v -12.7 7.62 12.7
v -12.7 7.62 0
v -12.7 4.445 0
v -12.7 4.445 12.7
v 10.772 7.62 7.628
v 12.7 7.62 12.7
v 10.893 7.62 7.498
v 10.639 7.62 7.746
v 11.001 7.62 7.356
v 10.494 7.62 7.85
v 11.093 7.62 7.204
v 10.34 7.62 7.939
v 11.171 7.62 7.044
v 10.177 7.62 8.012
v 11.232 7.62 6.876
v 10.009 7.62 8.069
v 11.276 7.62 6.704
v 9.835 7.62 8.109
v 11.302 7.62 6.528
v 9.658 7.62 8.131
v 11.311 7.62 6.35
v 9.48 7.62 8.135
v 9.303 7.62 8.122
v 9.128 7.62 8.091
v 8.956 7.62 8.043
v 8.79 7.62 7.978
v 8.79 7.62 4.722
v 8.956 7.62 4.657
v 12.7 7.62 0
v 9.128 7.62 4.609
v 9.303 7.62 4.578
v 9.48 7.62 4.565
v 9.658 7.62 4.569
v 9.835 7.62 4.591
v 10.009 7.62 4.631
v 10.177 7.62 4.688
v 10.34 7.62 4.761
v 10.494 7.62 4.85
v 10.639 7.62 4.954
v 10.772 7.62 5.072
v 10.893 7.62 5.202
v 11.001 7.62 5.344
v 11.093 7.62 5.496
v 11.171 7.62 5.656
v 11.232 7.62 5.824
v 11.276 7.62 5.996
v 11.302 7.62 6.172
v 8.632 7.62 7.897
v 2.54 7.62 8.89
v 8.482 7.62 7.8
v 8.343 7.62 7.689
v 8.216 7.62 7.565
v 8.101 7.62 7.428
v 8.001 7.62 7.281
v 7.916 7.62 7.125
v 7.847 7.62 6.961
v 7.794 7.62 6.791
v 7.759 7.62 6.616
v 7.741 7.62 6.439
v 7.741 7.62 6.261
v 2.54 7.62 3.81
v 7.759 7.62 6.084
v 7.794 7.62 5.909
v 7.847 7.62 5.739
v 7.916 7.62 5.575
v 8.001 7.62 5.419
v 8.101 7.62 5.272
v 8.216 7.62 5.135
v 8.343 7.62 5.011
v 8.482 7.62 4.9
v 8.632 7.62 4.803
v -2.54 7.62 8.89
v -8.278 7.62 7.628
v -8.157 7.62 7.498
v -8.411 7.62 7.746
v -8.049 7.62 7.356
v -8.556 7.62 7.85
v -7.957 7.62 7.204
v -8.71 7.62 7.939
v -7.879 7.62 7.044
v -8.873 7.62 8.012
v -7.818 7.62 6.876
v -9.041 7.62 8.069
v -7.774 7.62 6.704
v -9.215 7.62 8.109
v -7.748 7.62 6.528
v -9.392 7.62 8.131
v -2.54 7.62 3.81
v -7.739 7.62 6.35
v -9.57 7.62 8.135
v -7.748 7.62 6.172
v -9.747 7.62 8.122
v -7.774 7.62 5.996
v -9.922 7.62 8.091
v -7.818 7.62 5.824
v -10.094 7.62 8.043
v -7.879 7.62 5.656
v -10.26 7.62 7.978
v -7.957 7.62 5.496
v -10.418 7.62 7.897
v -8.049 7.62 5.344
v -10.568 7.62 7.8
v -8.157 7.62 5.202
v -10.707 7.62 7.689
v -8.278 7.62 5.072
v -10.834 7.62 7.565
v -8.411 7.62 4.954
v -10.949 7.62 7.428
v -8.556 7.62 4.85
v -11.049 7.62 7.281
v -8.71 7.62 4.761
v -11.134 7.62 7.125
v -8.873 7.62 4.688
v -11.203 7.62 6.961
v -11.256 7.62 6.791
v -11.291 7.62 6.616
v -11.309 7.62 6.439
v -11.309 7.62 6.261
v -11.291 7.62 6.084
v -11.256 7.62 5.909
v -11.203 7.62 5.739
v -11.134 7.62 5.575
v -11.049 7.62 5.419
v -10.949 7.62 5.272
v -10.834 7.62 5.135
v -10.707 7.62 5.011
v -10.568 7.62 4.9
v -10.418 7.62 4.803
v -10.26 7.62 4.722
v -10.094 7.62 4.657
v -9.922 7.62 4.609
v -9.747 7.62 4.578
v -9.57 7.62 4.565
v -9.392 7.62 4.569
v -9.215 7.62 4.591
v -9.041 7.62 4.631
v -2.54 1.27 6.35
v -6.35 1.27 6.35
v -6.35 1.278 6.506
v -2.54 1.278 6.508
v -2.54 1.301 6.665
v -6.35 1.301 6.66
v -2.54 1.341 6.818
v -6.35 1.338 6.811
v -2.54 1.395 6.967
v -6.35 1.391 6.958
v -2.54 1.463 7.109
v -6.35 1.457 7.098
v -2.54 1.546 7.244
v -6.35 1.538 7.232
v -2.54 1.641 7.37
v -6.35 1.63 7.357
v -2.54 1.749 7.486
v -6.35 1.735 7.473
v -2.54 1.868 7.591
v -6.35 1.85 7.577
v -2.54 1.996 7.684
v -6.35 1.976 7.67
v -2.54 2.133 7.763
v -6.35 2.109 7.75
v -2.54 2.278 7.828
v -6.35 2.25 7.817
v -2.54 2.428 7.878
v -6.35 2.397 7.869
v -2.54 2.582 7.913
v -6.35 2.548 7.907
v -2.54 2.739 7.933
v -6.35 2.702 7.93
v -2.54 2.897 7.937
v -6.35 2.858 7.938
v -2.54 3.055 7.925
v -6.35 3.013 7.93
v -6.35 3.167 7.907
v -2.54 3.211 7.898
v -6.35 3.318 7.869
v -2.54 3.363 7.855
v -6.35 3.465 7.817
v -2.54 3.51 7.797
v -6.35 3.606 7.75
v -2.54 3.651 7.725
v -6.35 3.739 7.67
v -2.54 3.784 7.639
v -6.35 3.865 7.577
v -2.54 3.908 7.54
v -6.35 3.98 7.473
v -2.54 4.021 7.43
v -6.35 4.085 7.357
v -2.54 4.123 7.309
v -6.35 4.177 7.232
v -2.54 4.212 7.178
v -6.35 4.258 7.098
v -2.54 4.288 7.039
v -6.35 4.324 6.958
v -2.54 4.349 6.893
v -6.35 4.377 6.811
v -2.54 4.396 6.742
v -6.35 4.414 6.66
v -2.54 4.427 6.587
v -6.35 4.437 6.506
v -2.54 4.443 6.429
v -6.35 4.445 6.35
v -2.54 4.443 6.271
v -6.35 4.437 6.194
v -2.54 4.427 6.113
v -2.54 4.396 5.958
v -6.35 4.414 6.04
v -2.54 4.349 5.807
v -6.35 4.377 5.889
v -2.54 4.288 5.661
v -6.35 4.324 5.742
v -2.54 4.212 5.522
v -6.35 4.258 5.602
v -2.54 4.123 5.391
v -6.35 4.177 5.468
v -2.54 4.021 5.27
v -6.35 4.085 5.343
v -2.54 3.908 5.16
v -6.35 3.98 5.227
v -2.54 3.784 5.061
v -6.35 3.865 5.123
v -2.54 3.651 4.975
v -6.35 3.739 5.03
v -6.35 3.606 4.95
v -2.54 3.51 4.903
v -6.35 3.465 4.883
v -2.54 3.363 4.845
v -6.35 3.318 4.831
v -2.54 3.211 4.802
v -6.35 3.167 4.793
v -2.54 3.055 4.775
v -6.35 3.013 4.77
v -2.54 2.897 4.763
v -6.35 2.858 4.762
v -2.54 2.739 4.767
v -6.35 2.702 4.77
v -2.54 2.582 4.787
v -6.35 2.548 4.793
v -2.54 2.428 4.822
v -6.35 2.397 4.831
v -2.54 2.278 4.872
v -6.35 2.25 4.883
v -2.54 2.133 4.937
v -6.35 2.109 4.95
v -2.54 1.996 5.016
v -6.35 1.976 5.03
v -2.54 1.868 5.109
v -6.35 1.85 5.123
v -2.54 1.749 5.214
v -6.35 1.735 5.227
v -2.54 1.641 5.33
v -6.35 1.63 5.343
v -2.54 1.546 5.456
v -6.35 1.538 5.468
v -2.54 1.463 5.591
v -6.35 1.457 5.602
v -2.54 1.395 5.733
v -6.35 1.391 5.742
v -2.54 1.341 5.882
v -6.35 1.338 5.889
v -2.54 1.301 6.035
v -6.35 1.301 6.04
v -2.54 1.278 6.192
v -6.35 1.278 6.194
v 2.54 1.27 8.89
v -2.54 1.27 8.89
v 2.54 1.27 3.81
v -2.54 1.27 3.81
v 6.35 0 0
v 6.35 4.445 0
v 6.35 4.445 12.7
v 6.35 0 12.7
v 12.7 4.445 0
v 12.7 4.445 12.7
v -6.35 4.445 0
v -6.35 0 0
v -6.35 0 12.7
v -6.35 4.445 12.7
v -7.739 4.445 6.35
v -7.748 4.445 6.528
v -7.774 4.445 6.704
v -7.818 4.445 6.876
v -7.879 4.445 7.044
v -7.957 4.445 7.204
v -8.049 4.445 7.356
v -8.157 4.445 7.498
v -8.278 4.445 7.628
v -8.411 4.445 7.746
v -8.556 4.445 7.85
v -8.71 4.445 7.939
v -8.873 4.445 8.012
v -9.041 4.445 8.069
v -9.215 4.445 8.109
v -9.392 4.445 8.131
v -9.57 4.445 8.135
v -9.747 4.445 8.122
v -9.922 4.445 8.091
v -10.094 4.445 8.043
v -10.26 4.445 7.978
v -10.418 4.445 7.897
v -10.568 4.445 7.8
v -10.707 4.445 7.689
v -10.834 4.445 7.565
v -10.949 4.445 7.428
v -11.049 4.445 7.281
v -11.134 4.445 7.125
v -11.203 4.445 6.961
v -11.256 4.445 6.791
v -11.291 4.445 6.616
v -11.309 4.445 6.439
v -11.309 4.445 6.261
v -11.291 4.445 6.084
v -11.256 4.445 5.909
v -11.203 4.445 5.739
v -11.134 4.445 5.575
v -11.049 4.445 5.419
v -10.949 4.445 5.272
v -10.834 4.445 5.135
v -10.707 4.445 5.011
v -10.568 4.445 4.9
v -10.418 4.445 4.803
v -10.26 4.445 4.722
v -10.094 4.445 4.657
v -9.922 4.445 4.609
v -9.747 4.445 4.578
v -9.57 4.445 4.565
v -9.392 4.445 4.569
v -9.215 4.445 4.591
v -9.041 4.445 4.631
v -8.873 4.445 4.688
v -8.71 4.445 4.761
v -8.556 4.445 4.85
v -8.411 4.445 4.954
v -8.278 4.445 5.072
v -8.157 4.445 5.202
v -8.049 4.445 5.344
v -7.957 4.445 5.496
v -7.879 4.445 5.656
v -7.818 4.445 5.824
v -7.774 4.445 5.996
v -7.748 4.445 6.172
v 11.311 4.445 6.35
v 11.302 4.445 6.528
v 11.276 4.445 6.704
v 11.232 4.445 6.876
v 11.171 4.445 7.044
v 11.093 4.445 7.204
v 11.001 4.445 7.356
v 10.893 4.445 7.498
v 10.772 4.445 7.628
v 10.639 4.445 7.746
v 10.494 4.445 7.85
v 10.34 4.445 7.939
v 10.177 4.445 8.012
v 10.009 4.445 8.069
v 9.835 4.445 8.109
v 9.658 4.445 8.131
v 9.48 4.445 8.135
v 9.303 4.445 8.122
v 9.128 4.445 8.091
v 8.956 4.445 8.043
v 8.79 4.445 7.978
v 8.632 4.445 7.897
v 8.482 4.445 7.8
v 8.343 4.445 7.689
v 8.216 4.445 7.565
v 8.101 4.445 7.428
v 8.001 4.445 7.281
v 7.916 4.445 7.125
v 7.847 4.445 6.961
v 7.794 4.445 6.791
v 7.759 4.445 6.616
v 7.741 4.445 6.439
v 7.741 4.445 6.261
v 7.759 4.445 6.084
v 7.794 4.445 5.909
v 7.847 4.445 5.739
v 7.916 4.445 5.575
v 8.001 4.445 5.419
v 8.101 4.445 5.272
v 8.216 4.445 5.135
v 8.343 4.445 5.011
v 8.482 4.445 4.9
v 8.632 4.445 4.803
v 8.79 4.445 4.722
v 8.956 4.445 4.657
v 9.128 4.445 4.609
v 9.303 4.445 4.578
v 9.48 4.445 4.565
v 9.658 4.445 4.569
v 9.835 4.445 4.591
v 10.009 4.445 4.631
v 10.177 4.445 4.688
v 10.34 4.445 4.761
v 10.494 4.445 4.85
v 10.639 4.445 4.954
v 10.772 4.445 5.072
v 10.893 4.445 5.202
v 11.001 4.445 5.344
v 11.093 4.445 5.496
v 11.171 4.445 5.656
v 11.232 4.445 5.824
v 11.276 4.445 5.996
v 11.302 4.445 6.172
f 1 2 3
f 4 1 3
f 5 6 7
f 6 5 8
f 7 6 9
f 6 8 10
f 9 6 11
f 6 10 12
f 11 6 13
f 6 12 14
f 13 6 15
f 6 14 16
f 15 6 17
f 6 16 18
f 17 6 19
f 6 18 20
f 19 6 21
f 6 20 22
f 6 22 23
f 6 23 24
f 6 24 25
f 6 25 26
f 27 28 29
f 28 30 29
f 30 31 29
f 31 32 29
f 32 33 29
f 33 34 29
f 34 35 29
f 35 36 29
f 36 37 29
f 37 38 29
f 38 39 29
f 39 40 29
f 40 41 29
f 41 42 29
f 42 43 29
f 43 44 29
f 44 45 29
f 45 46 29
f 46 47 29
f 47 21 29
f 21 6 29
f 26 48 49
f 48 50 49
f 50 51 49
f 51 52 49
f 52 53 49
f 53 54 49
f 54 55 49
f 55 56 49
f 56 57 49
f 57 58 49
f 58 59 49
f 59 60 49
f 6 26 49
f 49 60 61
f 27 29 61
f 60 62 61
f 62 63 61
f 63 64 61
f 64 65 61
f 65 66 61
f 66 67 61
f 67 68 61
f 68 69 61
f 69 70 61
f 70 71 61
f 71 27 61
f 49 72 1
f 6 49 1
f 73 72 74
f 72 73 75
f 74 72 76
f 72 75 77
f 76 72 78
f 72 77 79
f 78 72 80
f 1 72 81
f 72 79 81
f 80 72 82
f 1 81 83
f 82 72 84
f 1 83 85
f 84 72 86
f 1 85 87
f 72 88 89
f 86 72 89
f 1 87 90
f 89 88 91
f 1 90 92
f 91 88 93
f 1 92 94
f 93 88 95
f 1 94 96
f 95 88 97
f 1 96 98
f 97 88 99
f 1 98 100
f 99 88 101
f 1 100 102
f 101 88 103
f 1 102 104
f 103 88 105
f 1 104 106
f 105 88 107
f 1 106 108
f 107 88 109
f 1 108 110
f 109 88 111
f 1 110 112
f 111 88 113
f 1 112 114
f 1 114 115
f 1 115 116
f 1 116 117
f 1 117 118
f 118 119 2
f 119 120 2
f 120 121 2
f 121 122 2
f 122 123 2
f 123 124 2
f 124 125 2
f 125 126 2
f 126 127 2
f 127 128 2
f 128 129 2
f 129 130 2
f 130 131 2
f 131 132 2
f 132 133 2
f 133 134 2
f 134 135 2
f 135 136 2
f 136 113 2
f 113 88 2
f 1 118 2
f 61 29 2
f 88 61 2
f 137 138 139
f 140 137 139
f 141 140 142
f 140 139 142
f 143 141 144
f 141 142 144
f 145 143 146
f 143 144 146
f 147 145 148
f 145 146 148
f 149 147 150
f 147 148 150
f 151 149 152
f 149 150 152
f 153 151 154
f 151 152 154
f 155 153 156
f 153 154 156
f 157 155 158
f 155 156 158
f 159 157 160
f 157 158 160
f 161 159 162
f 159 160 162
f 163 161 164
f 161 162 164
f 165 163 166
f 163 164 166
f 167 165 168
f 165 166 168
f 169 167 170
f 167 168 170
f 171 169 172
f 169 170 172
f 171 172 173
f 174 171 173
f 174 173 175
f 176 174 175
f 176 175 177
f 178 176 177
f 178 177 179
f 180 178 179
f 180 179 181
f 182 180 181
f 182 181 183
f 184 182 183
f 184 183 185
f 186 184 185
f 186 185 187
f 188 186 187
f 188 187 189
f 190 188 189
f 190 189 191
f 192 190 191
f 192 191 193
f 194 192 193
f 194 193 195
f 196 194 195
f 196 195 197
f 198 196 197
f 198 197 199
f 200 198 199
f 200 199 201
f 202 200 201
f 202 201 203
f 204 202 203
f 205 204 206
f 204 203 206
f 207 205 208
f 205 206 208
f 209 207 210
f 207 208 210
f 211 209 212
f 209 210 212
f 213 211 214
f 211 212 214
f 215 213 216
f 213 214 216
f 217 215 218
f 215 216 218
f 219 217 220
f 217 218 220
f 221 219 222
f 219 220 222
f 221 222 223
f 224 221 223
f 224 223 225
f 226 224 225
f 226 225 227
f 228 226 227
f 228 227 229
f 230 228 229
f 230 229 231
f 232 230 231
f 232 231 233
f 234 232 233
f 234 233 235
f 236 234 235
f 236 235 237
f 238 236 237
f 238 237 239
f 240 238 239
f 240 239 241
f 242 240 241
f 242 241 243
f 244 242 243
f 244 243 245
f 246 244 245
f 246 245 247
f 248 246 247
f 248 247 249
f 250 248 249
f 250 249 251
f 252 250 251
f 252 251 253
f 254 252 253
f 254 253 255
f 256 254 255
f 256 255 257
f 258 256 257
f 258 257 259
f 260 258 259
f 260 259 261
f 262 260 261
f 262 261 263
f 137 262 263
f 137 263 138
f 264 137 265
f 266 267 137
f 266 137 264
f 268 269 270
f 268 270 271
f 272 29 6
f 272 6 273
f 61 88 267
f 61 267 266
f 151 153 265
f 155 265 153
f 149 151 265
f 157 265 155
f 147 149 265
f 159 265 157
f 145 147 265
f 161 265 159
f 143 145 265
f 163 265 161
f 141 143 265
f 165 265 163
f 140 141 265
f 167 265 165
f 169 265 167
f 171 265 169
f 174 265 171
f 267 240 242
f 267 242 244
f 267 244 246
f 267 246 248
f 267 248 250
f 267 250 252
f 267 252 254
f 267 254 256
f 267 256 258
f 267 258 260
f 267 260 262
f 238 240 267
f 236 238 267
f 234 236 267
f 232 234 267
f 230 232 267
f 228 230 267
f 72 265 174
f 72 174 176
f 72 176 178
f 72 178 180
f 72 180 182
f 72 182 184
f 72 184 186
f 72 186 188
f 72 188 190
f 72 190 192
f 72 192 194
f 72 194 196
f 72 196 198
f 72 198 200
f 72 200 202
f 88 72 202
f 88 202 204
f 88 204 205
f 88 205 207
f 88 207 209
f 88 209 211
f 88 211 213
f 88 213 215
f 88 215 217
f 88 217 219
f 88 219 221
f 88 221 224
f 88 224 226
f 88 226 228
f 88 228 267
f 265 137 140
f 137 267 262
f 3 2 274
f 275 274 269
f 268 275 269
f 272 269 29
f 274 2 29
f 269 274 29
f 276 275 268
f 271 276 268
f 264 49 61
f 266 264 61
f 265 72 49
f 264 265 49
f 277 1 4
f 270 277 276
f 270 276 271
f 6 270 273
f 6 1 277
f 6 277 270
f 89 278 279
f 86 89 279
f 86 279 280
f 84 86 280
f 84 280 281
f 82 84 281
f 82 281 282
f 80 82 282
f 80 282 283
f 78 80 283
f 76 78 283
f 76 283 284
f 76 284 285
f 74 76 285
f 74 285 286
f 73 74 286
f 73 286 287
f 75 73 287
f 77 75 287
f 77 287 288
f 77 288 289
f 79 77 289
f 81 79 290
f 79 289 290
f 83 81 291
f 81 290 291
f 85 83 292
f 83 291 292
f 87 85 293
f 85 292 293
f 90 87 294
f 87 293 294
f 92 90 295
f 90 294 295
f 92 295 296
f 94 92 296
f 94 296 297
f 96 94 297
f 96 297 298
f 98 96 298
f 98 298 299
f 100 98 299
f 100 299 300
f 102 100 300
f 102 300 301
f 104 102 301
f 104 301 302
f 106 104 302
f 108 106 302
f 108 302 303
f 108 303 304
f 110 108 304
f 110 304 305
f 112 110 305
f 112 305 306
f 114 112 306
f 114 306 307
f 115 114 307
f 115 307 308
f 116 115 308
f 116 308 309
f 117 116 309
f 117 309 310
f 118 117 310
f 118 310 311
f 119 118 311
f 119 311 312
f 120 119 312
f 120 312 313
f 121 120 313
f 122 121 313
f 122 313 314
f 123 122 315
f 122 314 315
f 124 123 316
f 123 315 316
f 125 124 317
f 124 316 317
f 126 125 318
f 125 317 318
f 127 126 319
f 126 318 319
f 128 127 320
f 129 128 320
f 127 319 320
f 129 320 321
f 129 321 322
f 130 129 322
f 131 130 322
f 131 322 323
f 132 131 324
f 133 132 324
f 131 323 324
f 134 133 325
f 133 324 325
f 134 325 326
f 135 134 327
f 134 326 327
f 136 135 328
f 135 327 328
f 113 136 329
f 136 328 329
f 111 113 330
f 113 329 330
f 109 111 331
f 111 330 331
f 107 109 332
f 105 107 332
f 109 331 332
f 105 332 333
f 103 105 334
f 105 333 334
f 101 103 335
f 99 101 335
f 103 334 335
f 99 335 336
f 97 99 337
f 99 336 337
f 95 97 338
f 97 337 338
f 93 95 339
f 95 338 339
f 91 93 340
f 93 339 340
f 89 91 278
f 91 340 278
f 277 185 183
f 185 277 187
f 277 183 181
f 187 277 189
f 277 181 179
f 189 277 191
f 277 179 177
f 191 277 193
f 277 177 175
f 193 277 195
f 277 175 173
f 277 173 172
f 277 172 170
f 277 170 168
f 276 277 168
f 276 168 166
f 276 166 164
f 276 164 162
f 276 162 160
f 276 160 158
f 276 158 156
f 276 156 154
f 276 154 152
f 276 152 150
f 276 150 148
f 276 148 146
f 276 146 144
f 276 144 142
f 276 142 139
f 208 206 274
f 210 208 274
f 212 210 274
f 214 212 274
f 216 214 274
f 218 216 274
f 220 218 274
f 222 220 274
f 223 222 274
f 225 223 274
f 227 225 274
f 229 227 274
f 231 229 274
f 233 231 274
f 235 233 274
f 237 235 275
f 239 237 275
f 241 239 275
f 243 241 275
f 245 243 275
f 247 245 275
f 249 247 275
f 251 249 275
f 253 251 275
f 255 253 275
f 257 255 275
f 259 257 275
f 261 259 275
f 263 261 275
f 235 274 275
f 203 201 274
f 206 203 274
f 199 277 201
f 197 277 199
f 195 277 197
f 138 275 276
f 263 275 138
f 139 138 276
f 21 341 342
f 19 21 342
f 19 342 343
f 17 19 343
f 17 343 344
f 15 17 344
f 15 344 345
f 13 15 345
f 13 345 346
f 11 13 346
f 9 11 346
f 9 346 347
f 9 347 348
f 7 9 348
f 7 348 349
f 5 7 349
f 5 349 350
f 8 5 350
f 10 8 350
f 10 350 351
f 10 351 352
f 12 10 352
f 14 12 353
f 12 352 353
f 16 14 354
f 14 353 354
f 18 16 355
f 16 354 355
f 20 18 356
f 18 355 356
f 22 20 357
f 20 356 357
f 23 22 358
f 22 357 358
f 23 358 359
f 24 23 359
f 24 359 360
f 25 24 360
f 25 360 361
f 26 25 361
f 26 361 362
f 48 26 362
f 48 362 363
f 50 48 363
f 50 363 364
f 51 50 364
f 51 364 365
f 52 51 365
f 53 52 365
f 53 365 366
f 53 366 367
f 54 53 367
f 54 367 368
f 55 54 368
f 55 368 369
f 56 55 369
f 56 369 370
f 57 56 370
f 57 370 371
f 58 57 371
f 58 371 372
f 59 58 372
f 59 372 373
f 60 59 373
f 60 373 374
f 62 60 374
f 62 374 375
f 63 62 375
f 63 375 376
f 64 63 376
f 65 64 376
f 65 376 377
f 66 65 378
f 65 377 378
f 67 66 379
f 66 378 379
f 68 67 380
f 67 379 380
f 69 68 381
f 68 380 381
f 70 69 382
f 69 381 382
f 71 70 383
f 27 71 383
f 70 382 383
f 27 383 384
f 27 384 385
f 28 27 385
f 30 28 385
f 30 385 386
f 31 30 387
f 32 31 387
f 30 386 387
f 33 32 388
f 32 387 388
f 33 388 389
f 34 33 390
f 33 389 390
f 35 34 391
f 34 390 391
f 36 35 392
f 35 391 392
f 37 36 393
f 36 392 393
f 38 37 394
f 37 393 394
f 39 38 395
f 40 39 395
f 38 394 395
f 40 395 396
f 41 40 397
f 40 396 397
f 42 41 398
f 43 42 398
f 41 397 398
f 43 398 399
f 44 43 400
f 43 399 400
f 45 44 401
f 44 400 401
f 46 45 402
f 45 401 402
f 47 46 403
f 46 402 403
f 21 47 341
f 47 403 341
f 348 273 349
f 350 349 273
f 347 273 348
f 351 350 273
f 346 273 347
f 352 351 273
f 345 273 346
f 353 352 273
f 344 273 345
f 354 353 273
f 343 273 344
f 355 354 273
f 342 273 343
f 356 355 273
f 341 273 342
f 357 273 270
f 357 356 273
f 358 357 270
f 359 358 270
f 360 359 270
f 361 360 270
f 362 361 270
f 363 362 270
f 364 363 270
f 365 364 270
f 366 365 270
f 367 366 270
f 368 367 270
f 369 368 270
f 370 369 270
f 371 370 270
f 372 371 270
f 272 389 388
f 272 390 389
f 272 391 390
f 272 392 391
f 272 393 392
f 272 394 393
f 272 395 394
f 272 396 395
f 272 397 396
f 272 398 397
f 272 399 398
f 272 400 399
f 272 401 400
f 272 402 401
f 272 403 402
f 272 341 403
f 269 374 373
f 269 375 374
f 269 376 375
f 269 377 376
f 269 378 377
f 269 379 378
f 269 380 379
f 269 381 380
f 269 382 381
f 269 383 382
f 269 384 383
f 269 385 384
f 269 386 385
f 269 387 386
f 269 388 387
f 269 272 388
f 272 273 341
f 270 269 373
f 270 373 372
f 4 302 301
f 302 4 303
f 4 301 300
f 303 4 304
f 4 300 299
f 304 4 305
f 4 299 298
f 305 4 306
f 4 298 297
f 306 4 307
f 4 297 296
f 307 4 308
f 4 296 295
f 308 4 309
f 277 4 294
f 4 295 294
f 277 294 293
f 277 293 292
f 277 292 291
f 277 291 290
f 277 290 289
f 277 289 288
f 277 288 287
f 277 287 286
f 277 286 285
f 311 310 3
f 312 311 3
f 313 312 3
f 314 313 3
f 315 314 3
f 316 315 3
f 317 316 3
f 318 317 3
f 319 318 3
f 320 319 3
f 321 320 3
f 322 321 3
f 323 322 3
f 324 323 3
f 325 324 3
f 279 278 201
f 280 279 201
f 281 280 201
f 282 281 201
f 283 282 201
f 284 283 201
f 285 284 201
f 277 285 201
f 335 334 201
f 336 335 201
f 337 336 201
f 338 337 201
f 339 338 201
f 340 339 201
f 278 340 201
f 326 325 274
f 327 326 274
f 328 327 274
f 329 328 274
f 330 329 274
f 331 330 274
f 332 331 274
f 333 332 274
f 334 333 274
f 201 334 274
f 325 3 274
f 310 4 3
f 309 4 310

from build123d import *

# Parameters (mm, degrees)
BOSS_EXTRUDE1_DEPTH = 12.7
SKETCH3_W           = 5.08
SKETCH3_H           = 5.08
CUT_EXTRUDE1_DEPTH  = 6.35
SKETCH2_R           = 1.5875
CUT_EXTRUDE2_DEPTH  = 3.81
CUT_EXTRUDE3_REACH  = 20.502
SKETCH4_R           = 1.7859375


with BuildPart() as part:
    # Sketch1 → Boss-Extrude1 (new body)
    with BuildSketch(Plane.XY):
        Polygon((0, 0), (0, 7.62), (12.7, 7.62), (12.7, 4.445), (6.35, 4.445), (6.35, 0), align=None)
    extrude(amount=BOSS_EXTRUDE1_DEPTH)

    # Mirror1: part across plane


with BuildPart() as part_1:
    add(part.part)
    add(part.part.mirror(Plane(origin=(0, 0, 12.7), x_dir=(0, 0, 1), z_dir=(-1, 0, 0))))

    # Sketch3 → Cut-Extrude1 (cut)
    with BuildSketch(Plane(origin=(0, 7.62, 0), x_dir=(1, 0, 0), z_dir=(0, 1, 0))):
        with Locations((0, -6.35)):
            Rectangle(SKETCH3_W, SKETCH3_H)
    extrude(amount=-CUT_EXTRUDE1_DEPTH, mode=Mode.SUBTRACT)

    # Sketch2 → Cut-Extrude2 (cut)
    with BuildSketch(Plane.ZY.offset(6.35)):
        with Locations(Location((6.35, 2.8575, 0), (0, 0, 270))):
            Circle(SKETCH2_R)
    extrude(amount=-CUT_EXTRUDE2_DEPTH, mode=Mode.SUBTRACT)

    # Sketch4 → Cut-Extrude3 (cut, up to next)
    with BuildSketch(Plane.XZ.offset(-4.445), mode=Mode.PRIVATE) as cut_extrude3_sk1:
        with Locations((9.525, 6.35)):
            Circle(SKETCH4_R)
    cut_extrude3_tool1 = extrude(cut_extrude3_sk1.sketch, amount=-CUT_EXTRUDE3_REACH, mode=Mode.PRIVATE) & part_1.part
    # Sketch4 → Cut-Extrude3 (cut, up to next)
    with BuildSketch(Plane.XZ.offset(-4.445), mode=Mode.PRIVATE) as cut_extrude3_sk2:
        with Locations((-9.525, 6.35)):
            Circle(SKETCH4_R)
    cut_extrude3_tool2 = extrude(cut_extrude3_sk2.sketch, amount=-CUT_EXTRUDE3_REACH, mode=Mode.PRIVATE) & part_1.part
    add(cut_extrude3_tool1.solids().sort_by_distance((9.525, 4.445, 6.35))[0], mode=Mode.SUBTRACT)
    add(cut_extrude3_tool2.solids().sort_by_distance((-9.525, 4.445, 6.35))[0], mode=Mode.SUBTRACT)


solid = part_1.part
